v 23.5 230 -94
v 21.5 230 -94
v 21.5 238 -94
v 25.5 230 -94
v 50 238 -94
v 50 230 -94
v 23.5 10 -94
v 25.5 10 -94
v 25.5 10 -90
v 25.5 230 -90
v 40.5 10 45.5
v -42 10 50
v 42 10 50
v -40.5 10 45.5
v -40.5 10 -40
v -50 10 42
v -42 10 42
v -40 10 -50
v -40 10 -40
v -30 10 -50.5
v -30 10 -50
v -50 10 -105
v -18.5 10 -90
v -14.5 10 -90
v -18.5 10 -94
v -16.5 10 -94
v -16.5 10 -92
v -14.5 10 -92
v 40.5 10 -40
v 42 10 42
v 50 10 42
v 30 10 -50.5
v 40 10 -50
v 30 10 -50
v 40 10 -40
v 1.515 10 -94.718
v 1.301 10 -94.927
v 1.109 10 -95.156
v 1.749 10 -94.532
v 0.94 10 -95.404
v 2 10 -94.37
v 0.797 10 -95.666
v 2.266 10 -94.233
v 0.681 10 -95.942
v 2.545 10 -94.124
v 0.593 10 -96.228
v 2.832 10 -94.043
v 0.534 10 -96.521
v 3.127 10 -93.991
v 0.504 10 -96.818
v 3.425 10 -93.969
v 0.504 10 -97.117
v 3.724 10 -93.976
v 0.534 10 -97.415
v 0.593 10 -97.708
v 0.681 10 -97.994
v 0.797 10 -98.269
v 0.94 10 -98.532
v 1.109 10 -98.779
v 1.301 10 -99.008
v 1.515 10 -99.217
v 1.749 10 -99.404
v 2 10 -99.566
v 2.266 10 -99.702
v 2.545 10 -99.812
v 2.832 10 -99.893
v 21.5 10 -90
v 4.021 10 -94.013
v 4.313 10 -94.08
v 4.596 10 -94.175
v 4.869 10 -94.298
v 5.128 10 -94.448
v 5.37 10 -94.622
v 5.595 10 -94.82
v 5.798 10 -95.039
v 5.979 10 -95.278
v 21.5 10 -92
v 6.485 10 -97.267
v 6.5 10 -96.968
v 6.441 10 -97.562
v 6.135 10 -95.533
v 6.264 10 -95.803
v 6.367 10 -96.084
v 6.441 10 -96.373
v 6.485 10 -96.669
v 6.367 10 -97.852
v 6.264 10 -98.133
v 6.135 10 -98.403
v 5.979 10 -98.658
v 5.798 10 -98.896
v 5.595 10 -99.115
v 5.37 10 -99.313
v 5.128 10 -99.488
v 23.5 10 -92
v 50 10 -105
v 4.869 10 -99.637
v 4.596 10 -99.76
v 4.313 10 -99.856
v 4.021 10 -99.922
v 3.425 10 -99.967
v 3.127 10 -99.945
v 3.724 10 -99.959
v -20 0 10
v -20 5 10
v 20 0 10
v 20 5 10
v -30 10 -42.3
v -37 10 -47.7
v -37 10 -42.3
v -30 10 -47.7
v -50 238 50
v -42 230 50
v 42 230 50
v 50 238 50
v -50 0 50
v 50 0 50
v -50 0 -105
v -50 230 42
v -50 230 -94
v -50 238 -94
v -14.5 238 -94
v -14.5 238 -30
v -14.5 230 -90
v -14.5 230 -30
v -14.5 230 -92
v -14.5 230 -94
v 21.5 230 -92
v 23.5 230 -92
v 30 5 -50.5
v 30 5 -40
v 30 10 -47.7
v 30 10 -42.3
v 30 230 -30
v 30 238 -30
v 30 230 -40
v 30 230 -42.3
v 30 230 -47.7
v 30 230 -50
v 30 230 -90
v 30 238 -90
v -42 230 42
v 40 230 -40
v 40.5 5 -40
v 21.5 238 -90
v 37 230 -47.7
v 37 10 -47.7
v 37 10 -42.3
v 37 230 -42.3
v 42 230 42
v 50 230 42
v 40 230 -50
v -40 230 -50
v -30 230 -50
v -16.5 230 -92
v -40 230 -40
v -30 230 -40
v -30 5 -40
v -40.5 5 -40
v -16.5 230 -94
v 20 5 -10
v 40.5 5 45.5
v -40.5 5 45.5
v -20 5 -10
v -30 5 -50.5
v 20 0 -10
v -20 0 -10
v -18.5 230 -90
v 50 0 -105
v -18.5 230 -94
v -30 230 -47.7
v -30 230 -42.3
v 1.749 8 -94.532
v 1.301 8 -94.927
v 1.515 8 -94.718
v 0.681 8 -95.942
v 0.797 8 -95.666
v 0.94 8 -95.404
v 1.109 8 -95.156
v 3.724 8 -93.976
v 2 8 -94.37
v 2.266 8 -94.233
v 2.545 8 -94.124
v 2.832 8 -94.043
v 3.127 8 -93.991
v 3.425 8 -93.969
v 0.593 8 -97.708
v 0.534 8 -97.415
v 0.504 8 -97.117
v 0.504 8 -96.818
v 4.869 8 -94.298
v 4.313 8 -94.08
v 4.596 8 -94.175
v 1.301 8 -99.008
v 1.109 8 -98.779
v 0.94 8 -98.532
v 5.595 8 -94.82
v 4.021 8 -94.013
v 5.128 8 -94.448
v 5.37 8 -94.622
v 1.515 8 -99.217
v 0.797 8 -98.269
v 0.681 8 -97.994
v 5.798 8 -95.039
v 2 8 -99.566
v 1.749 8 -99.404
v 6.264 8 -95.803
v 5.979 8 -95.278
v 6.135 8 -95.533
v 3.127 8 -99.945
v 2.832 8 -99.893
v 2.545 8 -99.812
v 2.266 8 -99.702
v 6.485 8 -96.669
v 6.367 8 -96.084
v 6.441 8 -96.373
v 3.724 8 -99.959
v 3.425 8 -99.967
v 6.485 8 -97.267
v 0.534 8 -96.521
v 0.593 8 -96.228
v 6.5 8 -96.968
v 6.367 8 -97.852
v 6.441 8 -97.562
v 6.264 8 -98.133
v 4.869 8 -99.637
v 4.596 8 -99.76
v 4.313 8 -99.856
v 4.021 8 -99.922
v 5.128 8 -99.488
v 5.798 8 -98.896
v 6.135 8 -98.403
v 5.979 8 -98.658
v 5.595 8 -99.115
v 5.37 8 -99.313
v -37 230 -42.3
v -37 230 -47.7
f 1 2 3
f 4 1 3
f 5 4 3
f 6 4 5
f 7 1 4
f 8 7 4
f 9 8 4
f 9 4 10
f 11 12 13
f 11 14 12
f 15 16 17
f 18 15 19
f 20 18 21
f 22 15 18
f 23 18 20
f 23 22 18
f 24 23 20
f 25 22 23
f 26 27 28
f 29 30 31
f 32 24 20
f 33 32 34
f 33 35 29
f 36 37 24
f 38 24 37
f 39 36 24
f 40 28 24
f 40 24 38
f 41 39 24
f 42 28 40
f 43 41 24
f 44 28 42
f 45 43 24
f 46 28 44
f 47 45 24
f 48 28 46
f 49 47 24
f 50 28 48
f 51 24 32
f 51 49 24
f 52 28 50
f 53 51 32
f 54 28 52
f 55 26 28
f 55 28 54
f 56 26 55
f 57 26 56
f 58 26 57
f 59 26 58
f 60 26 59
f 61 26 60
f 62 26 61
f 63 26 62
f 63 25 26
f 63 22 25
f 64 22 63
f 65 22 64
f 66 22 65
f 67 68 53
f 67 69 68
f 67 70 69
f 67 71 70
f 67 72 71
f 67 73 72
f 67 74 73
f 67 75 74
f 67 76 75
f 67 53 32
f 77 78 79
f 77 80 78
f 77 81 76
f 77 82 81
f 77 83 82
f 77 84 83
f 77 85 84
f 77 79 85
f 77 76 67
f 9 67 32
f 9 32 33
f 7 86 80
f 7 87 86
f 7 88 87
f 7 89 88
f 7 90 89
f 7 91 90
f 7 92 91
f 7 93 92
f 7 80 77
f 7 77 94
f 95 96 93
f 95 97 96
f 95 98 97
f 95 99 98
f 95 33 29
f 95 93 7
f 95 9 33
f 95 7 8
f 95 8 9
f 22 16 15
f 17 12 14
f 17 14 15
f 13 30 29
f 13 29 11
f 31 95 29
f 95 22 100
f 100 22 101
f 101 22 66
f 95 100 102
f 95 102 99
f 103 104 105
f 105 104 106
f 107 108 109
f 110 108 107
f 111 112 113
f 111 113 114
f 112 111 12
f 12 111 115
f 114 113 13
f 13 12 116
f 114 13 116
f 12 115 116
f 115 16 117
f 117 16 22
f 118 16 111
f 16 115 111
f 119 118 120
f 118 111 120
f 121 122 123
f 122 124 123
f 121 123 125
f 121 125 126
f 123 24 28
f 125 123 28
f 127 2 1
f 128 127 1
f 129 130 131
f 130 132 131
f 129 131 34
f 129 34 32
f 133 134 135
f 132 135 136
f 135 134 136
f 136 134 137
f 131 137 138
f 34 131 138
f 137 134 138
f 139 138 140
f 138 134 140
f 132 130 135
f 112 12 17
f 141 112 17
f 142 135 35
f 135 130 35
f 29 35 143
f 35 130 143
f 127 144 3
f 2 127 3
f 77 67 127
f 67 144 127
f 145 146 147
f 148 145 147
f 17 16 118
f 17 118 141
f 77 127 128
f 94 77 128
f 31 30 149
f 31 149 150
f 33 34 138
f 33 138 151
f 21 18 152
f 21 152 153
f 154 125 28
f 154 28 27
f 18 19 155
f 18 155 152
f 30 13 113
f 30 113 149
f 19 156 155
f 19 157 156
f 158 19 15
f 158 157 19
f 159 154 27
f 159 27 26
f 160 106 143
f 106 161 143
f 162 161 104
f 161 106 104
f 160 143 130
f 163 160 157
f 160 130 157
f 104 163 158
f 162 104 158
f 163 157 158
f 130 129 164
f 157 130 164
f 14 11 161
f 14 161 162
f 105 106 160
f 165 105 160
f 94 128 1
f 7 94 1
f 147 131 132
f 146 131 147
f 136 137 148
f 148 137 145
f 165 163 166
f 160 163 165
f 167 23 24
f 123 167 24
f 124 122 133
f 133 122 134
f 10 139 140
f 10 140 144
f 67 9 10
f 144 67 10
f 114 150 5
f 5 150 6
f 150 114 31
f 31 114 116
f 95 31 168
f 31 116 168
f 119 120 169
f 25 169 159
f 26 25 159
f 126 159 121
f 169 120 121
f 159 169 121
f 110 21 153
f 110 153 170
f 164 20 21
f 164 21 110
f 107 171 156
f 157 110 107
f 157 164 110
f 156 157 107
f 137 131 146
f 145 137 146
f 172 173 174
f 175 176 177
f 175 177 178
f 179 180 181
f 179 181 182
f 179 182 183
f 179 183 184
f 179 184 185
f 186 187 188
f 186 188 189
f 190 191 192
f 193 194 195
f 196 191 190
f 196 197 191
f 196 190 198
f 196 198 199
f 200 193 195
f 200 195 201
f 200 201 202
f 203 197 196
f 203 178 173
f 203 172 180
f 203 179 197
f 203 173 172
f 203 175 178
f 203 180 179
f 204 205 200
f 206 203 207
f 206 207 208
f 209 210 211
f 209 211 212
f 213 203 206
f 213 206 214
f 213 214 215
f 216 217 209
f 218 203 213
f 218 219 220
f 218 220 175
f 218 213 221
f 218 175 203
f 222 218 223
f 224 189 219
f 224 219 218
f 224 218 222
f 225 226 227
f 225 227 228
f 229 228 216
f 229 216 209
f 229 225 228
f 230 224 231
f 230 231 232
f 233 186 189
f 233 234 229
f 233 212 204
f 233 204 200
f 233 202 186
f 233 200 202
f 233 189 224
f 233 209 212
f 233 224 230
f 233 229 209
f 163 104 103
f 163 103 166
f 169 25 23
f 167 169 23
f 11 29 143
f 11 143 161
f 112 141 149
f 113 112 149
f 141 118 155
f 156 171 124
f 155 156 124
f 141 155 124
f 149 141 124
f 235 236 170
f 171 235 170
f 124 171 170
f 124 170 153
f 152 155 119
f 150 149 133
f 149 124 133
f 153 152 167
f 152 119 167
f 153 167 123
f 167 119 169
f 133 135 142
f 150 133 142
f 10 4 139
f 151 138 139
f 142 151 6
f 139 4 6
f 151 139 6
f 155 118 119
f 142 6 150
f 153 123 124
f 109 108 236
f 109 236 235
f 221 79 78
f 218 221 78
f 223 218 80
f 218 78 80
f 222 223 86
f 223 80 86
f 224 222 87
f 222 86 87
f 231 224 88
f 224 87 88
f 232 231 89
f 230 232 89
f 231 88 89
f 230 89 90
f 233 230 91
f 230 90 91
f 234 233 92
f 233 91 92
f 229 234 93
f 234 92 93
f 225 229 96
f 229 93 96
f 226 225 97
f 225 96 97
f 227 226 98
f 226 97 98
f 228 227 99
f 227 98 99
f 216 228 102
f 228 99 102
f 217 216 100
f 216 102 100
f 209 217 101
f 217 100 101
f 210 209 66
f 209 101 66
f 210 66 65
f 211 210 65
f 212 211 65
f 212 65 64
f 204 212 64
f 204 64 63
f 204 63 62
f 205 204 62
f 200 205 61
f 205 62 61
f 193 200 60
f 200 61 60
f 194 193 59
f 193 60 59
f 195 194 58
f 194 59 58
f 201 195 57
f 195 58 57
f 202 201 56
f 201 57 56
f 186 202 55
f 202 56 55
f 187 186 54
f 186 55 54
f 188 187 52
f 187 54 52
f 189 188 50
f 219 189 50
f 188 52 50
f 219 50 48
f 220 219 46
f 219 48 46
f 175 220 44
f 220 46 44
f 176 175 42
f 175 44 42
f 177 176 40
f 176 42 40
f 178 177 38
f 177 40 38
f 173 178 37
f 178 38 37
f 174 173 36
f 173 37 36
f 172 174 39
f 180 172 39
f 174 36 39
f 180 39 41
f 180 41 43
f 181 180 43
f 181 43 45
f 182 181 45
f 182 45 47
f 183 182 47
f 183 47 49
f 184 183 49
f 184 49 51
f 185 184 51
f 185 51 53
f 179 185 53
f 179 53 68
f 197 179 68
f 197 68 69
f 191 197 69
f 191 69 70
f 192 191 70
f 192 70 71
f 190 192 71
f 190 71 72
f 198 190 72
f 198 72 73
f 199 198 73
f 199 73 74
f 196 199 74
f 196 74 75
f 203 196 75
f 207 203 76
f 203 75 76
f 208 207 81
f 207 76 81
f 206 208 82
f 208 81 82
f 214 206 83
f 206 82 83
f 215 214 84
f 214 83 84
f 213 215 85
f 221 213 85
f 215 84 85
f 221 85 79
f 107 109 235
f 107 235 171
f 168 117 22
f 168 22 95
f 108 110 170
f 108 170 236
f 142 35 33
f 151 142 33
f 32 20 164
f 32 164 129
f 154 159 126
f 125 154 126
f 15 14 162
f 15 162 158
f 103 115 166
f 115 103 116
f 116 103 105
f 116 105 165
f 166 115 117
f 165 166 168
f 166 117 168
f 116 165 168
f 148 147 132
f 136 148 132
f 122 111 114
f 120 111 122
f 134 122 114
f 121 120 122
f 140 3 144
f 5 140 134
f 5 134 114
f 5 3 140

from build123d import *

# Parameters (mm, degrees)
SKETCH1_W           = 100
SKETCH1_H           = 100
BOSS_EXTRUDE1_DEPTH = 10
BOSS_EXTRUDE2_DEPTH = 220
SKETCH4_W           = 100
SKETCH4_H           = 40
BOSS_EXTRUDE3_DEPTH = 10
SKETCH5_W           = 100
SKETCH5_H           = 140
BOSS_EXTRUDE4_DEPTH = 8
CUT_EXTRUDE2_DEPTH  = 11
SKETCH7_W           = 8
SKETCH7_H           = 8
BOSS_EXTRUDE5_DEPTH = 220
CUT_EXTRUDE3_DEPTH  = 5
CUT_EXTRUDE4_REACH  = 7
SKETCH9_W           = 40
SKETCH9_H           = 20
SKETCH11_W          = 100
SKETCH11_H          = 15
BOSS_EXTRUDE6_DEPTH = 10
SKETCH12_R          = 3
CUT_EXTRUDE5_DEPTH  = 2
BOSS_EXTRUDE7_DEPTH = 228
SKETCH14_W          = 35.5
SKETCH14_H          = 4
SKETCH14_W_2        = 28.5
BOSS_EXTRUDE8_DEPTH = 8


with BuildPart() as part:
    # Sketch1 → Boss-Extrude1 (new body)
    with BuildSketch(Plane(origin=(0, 0, 0), x_dir=(1, 0, 0), z_dir=(0, 1, 0))):
        Rectangle(SKETCH1_W, SKETCH1_H)
    extrude(amount=BOSS_EXTRUDE1_DEPTH)

    # Sketch3 → Boss-Extrude2 (add)
    with BuildSketch(Plane(origin=(0, 10, 0), x_dir=(1, 0, 0), z_dir=(0, 1, 0))):
        Polygon((-40, 40), (-40, 50), (-30, 50), (-30, 47.7), (-37, 47.7), (-37, 42.3), (-30, 42.3), (-30, 40), align=None)
        Polygon((30, 42.3), (30, 40), (40, 40), (40, 50), (30, 50), (30, 47.7), (37, 47.7), (37, 42.3), align=None)
    extrude(amount=BOSS_EXTRUDE2_DEPTH)

    # Sketch4 → Boss-Extrude3 (add)
    with BuildSketch(Plane(origin=(0, 0, 0), x_dir=(1, 0, 0), z_dir=(0, 1, 0))):
        with Locations((0, 70)):
            Rectangle(SKETCH4_W, SKETCH4_H)
    extrude(amount=BOSS_EXTRUDE3_DEPTH)

    # Sketch5 → Boss-Extrude4 (add)
    with BuildSketch(Plane(origin=(0, 230, 0), x_dir=(1, 0, 0), z_dir=(0, 1, 0))):
        with Locations((0, 20)):
            Rectangle(SKETCH5_W, SKETCH5_H)
    extrude(amount=BOSS_EXTRUDE4_DEPTH)

    # Sketch6 → Cut-Extrude2 (cut)
    with BuildSketch(Plane(origin=(0, 238, 0), x_dir=(1, 0, 0), z_dir=(0, 1, 0))):
        Polygon((-4.5, 30), (30, 30), (30, 90), (-4.5, 90), (-14.5, 90), (-14.5, 30), align=None)
    extrude(amount=-CUT_EXTRUDE2_DEPTH, mode=Mode.SUBTRACT)

    # Sketch7 → Boss-Extrude5 (add)
    with BuildSketch(Plane(origin=(0, 10, 0), x_dir=(1, 0, 0), z_dir=(0, 1, 0))):
        with Locations((-46, -46)):
            Rectangle(SKETCH7_W, SKETCH7_H)
        with Locations((46, -46)):
            Rectangle(SKETCH7_W, SKETCH7_H)
    extrude(amount=BOSS_EXTRUDE5_DEPTH)

    # Sketch8 → Cut-Extrude3 (cut)
    with BuildSketch(Plane(origin=(0, 10, 0), x_dir=(1, 0, 0), z_dir=(0, 1, 0))):
        Polygon((30, 40), (40.5, 40), (40.5, -45.5), (-40.5, -45.5), (-40.5, 40), (-30, 40), (-30, 50.5), (30, 50.5), align=None)
    extrude(amount=-CUT_EXTRUDE3_DEPTH, mode=Mode.SUBTRACT)

    # Sketch9 → Cut-Extrude4 (cut, up to next)
    with BuildSketch(Plane(origin=(0, 5, 0), x_dir=(1, 0, 0), z_dir=(0, 1, 0)), mode=Mode.PRIVATE) as cut_extrude4_sk1:
        Rectangle(SKETCH9_W, SKETCH9_H)
    cut_extrude4_tool1 = extrude(cut_extrude4_sk1.sketch, amount=-CUT_EXTRUDE4_REACH, mode=Mode.PRIVATE) & part.part
    add(cut_extrude4_tool1.solids().sort_by_distance((0, 5, 0))[0], mode=Mode.SUBTRACT)

    # Sketch11 → Boss-Extrude6 (add)
    with BuildSketch(Plane(origin=(0, 0, 0), x_dir=(1, 0, 0), z_dir=(0, 1, 0))):
        with Locations((0, 97.5)):
            Rectangle(SKETCH11_W, SKETCH11_H)
    extrude(amount=BOSS_EXTRUDE6_DEPTH)

    # Sketch12 → Cut-Extrude5 (cut)
    with BuildSketch(Plane(origin=(0, 10, 0), x_dir=(1, 0, 0), z_dir=(0, 1, 0))):
        with Locations((3.5, 96.967812545)):
            Circle(SKETCH12_R)
    extrude(amount=-CUT_EXTRUDE5_DEPTH, mode=Mode.SUBTRACT)

    # Sketch13 → Boss-Extrude7 (add)
    with BuildSketch(Plane(origin=(0, 10, 0), x_dir=(1, 0, 0), z_dir=(0, 1, 0))):
        Polygon((21.5, 92), (23.5, 92), (23.5, 94), (25.5, 94), (25.5, 90), (21.5, 90), align=None)
        Polygon((-14.5, 92), (-16.5, 92), (-16.5, 94), (-18.5, 94), (-18.5, 90), (-14.5, 90), align=None)
    extrude(amount=BOSS_EXTRUDE7_DEPTH)

    # Sketch14 → Boss-Extrude8 (add)
    with BuildSketch(Plane(origin=(0, 238, 0), x_dir=(1, 0, 0), z_dir=(0, 1, 0))):
        with Locations((-32.25, 92)):
            Rectangle(SKETCH14_W, SKETCH14_H)
        with Locations((35.75, 92)):
            Rectangle(SKETCH14_W_2, SKETCH14_H)
    extrude(amount=-BOSS_EXTRUDE8_DEPTH)


solid = part.part
